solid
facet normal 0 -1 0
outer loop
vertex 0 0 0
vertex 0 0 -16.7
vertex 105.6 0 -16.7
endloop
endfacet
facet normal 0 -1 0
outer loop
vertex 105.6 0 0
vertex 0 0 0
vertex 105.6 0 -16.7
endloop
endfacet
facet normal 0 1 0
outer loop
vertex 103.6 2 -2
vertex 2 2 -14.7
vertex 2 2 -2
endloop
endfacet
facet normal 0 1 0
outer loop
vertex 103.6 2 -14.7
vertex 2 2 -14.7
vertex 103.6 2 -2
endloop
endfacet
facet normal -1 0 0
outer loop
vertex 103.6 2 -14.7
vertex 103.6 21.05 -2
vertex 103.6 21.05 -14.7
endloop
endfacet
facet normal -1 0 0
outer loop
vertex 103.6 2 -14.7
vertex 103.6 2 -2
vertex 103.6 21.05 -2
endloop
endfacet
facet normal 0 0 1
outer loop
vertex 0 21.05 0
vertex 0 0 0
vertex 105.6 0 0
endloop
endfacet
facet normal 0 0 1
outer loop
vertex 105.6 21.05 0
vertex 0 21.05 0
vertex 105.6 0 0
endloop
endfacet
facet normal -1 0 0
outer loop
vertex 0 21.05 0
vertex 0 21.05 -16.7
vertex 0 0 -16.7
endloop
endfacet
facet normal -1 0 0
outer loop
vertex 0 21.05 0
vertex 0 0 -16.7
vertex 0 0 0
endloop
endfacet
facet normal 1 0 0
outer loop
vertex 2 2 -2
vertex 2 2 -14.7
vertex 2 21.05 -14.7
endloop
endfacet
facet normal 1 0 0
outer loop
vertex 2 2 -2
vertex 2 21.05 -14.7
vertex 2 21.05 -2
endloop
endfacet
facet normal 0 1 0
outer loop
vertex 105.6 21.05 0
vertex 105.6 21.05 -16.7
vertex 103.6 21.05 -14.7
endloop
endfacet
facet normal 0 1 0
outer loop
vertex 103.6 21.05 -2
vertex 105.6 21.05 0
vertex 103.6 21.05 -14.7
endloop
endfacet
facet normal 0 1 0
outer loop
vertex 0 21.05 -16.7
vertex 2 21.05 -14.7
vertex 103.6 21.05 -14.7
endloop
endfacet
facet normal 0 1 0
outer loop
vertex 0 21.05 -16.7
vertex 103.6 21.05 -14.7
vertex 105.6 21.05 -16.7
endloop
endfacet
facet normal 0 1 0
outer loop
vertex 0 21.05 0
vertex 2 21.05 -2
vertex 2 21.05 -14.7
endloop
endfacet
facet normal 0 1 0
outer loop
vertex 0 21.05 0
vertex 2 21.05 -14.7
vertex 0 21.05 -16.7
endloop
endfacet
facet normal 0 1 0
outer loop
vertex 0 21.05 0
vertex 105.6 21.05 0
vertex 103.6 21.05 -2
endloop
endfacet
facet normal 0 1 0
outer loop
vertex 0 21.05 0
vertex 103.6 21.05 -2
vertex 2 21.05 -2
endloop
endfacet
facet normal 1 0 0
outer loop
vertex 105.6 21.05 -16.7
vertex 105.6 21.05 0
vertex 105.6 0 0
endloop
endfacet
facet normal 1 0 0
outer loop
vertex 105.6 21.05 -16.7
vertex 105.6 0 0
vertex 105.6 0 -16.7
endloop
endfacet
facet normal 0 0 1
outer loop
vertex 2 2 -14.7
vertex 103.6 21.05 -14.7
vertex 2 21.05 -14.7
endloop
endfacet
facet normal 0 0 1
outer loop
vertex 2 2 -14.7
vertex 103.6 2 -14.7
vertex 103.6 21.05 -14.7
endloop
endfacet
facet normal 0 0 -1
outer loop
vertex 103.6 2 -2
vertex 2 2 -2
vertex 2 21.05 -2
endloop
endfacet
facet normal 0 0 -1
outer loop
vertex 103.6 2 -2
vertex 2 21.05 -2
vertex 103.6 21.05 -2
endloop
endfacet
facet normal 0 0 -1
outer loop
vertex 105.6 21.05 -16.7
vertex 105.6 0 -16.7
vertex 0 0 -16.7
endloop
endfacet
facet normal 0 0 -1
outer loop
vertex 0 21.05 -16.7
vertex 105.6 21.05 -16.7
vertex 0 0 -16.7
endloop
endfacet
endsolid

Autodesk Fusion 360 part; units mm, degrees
sketch "Sketch1" plane through (0, 0, 0) normal (0, 1, 0) x (1, 0, 0)
  line L0 (0, 0) -> (105.6, 0)
  line L1 (105.6, 0) -> (105.6, 16.7)
  line L2 (105.6, 16.7) -> (0, 16.7)
  line L3 (0, 16.7) -> (0, 0)
  dimension "d1" = 105.6
  dimension "d2" = 16.7
extrude "Extrude1" add sketch "Sketch1" along normal blind 2
sketch "Sketch2" plane through (0, 2, 0) normal (0, 1, 0) x (-1, 0, 0)
  line L0 (0, -16.7) -> (0, 0)
  line L1 (0, 0) -> (-105.6, 0)
  line L2 (-105.6, 0) -> (-105.6, -16.7)
  line L3 (-105.6, -16.7) -> (0, -16.7)
  line L4 (0, 0) -> (-105.6, 0)
  line L5 (-105.6, 0) -> (-105.6, -16.7)
  line L6 (-105.6, -16.7) -> (0, -16.7)
  line L7 (0, -16.7) -> (0, 0)
  line L8 (-2, -2) -> (-103.6, -2)
  line L9 (-103.6, -2) -> (-103.6, -14.7)
  line L10 (-103.6, -14.7) -> (-2, -14.7)
  line L11 (-2, -14.7) -> (-2, -2)
  dimension "d5" = 2
extrude "Extrude2" add sketch "Sketch2" along normal blind 19.05
